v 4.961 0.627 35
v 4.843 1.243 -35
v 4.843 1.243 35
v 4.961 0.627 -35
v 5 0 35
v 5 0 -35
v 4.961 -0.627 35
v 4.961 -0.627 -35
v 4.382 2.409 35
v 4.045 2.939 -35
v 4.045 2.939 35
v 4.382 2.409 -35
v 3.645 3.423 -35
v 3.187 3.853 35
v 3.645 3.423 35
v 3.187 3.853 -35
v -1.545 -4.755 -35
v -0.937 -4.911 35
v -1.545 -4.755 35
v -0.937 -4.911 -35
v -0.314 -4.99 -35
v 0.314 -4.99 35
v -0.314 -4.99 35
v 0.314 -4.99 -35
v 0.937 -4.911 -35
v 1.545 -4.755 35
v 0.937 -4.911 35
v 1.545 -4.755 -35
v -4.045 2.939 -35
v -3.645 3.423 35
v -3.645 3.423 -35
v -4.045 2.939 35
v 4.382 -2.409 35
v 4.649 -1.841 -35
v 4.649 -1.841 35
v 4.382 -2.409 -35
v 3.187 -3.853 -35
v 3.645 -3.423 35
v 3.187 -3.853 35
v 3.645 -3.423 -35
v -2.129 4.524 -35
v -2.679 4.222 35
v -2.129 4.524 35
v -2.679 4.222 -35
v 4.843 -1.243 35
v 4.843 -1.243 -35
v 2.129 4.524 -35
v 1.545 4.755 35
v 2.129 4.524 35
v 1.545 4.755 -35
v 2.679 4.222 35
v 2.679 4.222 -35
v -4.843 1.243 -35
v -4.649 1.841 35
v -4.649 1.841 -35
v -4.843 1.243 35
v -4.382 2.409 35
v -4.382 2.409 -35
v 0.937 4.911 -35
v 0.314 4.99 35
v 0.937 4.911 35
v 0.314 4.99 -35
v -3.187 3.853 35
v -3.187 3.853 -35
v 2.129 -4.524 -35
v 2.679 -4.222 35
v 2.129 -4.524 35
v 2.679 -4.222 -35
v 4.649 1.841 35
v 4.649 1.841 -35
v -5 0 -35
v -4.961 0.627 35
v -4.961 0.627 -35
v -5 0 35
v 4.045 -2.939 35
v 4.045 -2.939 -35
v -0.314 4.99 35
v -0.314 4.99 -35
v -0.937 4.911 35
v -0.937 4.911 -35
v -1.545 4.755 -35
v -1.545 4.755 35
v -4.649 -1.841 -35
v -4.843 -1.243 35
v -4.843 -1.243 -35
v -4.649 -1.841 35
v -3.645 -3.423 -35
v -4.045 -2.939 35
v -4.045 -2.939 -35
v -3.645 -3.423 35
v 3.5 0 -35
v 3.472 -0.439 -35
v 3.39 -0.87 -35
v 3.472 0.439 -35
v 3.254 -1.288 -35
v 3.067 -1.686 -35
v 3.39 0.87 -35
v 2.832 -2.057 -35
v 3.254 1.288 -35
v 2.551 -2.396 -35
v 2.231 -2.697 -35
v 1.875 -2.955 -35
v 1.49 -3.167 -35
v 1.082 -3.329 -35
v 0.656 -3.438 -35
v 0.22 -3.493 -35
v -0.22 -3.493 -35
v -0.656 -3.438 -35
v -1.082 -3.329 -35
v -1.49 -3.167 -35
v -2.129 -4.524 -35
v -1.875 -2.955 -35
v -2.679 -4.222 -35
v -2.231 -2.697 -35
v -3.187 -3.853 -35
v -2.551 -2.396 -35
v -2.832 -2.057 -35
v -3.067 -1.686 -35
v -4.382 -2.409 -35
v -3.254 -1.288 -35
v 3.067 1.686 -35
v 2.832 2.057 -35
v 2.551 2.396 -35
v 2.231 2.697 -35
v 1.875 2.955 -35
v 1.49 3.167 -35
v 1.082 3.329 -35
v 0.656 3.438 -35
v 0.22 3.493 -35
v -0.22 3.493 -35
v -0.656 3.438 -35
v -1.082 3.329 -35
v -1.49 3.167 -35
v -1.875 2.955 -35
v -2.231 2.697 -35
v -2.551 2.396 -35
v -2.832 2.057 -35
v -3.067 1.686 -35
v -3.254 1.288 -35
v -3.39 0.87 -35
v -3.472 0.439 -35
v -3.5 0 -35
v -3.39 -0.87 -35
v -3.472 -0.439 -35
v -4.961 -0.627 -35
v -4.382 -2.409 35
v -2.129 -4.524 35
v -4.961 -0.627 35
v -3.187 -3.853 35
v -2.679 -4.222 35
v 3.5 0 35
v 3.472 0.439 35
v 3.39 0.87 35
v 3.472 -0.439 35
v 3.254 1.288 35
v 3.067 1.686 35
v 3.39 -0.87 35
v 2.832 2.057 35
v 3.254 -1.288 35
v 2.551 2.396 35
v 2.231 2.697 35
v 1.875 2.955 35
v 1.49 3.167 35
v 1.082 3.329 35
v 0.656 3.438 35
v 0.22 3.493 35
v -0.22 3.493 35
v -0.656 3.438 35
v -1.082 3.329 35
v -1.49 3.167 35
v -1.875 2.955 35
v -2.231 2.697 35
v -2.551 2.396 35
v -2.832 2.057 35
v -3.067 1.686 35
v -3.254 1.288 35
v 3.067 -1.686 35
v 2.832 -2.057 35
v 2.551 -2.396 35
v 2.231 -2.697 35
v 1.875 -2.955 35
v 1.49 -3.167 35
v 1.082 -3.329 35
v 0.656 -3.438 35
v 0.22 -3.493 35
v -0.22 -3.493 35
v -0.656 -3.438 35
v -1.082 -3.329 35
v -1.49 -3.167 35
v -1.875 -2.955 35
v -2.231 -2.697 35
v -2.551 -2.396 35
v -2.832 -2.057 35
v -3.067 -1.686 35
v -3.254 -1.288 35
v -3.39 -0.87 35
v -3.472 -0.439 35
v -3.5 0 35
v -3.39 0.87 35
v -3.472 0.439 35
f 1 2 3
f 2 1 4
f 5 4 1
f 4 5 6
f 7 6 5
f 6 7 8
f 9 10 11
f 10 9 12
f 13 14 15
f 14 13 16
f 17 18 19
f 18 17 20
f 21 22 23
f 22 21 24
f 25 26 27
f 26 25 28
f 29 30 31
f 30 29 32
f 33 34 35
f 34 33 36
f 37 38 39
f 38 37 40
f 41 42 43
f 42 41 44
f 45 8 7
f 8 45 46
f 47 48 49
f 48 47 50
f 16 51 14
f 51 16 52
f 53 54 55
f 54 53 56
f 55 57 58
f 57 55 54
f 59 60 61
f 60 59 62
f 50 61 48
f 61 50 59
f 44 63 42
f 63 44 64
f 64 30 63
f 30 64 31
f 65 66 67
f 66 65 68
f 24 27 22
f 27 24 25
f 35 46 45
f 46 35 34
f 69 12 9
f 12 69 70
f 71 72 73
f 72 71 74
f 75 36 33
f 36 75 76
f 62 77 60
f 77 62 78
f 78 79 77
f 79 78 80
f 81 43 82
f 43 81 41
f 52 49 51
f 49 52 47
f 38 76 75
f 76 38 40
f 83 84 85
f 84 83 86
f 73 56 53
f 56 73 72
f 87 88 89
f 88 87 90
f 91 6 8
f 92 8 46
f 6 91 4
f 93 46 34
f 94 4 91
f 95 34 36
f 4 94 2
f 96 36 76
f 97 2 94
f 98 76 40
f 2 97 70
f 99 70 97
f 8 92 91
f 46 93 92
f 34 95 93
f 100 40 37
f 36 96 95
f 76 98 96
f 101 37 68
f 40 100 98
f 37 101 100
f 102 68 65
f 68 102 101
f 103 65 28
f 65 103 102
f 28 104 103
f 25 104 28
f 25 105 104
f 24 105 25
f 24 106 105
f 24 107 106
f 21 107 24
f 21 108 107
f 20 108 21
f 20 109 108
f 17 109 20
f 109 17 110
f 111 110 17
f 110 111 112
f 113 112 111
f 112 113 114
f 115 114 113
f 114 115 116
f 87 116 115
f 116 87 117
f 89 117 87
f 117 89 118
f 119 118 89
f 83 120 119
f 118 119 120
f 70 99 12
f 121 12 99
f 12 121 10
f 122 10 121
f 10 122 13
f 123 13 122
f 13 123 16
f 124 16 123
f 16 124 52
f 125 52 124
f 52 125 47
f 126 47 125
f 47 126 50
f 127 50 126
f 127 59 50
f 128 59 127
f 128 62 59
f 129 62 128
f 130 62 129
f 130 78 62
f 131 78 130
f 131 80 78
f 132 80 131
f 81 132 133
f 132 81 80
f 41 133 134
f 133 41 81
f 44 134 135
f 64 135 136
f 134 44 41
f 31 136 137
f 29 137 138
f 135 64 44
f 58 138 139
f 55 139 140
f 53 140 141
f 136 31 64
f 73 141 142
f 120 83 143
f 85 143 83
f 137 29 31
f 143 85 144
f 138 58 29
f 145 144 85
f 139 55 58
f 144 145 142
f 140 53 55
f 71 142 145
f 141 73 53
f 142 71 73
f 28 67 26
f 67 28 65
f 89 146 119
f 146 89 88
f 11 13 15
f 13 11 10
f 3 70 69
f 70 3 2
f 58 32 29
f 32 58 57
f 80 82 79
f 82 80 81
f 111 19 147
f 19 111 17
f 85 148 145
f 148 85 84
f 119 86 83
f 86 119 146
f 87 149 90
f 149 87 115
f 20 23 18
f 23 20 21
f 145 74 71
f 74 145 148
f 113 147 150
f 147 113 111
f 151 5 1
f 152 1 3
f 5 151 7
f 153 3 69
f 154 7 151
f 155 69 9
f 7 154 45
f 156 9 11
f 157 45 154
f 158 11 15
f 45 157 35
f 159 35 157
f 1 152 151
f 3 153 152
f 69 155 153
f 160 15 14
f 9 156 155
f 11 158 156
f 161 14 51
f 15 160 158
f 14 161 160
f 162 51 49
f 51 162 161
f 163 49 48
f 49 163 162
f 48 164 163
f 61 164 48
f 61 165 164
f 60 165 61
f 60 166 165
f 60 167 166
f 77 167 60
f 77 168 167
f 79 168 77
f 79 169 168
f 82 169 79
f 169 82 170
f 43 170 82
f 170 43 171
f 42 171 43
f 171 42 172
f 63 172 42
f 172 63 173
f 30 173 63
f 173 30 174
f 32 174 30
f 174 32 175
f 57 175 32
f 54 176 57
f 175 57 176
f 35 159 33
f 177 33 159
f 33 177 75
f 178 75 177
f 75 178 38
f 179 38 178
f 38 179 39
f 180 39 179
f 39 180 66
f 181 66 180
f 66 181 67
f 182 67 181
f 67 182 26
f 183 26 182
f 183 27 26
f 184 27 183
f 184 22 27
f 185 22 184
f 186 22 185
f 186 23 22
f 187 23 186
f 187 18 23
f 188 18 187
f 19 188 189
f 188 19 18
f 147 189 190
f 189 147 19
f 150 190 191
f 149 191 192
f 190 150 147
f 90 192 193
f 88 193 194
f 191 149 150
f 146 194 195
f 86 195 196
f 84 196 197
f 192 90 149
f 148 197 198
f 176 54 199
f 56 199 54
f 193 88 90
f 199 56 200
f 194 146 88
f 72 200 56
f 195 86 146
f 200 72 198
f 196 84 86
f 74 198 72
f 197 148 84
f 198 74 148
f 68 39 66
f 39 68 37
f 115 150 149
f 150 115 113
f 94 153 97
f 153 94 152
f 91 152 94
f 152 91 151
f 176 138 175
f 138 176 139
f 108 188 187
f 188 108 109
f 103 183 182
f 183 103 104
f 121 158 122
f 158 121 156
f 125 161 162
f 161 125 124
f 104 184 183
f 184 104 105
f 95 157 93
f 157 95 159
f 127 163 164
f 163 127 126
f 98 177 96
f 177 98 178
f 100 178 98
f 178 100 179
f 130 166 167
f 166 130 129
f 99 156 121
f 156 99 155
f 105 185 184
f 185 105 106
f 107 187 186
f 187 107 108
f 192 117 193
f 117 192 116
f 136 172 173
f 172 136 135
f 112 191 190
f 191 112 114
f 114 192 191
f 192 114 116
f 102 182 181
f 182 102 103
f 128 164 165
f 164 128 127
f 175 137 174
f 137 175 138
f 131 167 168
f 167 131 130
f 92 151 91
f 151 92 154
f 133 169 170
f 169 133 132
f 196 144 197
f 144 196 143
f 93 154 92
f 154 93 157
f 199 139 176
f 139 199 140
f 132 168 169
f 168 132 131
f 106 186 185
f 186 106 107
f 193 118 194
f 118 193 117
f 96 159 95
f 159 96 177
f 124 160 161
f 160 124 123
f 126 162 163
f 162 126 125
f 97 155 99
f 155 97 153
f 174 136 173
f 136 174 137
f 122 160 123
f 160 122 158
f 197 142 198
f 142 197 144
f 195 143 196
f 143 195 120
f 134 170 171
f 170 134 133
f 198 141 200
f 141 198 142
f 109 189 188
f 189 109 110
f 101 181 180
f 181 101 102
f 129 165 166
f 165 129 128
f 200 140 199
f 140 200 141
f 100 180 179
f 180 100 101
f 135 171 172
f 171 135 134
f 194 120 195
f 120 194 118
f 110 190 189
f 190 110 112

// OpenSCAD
$fn = 50;


difference() {
	union() {
		translate(v = [0, 0, -35.0000000000]) {
			cylinder(h = 70, r = 5.0000000000);
		}
	}
	union() {
		translate(v = [0, 0, -100.0000000000]) {
			cylinder(h = 200, r = 3.5000000000);
		}
	}
}
